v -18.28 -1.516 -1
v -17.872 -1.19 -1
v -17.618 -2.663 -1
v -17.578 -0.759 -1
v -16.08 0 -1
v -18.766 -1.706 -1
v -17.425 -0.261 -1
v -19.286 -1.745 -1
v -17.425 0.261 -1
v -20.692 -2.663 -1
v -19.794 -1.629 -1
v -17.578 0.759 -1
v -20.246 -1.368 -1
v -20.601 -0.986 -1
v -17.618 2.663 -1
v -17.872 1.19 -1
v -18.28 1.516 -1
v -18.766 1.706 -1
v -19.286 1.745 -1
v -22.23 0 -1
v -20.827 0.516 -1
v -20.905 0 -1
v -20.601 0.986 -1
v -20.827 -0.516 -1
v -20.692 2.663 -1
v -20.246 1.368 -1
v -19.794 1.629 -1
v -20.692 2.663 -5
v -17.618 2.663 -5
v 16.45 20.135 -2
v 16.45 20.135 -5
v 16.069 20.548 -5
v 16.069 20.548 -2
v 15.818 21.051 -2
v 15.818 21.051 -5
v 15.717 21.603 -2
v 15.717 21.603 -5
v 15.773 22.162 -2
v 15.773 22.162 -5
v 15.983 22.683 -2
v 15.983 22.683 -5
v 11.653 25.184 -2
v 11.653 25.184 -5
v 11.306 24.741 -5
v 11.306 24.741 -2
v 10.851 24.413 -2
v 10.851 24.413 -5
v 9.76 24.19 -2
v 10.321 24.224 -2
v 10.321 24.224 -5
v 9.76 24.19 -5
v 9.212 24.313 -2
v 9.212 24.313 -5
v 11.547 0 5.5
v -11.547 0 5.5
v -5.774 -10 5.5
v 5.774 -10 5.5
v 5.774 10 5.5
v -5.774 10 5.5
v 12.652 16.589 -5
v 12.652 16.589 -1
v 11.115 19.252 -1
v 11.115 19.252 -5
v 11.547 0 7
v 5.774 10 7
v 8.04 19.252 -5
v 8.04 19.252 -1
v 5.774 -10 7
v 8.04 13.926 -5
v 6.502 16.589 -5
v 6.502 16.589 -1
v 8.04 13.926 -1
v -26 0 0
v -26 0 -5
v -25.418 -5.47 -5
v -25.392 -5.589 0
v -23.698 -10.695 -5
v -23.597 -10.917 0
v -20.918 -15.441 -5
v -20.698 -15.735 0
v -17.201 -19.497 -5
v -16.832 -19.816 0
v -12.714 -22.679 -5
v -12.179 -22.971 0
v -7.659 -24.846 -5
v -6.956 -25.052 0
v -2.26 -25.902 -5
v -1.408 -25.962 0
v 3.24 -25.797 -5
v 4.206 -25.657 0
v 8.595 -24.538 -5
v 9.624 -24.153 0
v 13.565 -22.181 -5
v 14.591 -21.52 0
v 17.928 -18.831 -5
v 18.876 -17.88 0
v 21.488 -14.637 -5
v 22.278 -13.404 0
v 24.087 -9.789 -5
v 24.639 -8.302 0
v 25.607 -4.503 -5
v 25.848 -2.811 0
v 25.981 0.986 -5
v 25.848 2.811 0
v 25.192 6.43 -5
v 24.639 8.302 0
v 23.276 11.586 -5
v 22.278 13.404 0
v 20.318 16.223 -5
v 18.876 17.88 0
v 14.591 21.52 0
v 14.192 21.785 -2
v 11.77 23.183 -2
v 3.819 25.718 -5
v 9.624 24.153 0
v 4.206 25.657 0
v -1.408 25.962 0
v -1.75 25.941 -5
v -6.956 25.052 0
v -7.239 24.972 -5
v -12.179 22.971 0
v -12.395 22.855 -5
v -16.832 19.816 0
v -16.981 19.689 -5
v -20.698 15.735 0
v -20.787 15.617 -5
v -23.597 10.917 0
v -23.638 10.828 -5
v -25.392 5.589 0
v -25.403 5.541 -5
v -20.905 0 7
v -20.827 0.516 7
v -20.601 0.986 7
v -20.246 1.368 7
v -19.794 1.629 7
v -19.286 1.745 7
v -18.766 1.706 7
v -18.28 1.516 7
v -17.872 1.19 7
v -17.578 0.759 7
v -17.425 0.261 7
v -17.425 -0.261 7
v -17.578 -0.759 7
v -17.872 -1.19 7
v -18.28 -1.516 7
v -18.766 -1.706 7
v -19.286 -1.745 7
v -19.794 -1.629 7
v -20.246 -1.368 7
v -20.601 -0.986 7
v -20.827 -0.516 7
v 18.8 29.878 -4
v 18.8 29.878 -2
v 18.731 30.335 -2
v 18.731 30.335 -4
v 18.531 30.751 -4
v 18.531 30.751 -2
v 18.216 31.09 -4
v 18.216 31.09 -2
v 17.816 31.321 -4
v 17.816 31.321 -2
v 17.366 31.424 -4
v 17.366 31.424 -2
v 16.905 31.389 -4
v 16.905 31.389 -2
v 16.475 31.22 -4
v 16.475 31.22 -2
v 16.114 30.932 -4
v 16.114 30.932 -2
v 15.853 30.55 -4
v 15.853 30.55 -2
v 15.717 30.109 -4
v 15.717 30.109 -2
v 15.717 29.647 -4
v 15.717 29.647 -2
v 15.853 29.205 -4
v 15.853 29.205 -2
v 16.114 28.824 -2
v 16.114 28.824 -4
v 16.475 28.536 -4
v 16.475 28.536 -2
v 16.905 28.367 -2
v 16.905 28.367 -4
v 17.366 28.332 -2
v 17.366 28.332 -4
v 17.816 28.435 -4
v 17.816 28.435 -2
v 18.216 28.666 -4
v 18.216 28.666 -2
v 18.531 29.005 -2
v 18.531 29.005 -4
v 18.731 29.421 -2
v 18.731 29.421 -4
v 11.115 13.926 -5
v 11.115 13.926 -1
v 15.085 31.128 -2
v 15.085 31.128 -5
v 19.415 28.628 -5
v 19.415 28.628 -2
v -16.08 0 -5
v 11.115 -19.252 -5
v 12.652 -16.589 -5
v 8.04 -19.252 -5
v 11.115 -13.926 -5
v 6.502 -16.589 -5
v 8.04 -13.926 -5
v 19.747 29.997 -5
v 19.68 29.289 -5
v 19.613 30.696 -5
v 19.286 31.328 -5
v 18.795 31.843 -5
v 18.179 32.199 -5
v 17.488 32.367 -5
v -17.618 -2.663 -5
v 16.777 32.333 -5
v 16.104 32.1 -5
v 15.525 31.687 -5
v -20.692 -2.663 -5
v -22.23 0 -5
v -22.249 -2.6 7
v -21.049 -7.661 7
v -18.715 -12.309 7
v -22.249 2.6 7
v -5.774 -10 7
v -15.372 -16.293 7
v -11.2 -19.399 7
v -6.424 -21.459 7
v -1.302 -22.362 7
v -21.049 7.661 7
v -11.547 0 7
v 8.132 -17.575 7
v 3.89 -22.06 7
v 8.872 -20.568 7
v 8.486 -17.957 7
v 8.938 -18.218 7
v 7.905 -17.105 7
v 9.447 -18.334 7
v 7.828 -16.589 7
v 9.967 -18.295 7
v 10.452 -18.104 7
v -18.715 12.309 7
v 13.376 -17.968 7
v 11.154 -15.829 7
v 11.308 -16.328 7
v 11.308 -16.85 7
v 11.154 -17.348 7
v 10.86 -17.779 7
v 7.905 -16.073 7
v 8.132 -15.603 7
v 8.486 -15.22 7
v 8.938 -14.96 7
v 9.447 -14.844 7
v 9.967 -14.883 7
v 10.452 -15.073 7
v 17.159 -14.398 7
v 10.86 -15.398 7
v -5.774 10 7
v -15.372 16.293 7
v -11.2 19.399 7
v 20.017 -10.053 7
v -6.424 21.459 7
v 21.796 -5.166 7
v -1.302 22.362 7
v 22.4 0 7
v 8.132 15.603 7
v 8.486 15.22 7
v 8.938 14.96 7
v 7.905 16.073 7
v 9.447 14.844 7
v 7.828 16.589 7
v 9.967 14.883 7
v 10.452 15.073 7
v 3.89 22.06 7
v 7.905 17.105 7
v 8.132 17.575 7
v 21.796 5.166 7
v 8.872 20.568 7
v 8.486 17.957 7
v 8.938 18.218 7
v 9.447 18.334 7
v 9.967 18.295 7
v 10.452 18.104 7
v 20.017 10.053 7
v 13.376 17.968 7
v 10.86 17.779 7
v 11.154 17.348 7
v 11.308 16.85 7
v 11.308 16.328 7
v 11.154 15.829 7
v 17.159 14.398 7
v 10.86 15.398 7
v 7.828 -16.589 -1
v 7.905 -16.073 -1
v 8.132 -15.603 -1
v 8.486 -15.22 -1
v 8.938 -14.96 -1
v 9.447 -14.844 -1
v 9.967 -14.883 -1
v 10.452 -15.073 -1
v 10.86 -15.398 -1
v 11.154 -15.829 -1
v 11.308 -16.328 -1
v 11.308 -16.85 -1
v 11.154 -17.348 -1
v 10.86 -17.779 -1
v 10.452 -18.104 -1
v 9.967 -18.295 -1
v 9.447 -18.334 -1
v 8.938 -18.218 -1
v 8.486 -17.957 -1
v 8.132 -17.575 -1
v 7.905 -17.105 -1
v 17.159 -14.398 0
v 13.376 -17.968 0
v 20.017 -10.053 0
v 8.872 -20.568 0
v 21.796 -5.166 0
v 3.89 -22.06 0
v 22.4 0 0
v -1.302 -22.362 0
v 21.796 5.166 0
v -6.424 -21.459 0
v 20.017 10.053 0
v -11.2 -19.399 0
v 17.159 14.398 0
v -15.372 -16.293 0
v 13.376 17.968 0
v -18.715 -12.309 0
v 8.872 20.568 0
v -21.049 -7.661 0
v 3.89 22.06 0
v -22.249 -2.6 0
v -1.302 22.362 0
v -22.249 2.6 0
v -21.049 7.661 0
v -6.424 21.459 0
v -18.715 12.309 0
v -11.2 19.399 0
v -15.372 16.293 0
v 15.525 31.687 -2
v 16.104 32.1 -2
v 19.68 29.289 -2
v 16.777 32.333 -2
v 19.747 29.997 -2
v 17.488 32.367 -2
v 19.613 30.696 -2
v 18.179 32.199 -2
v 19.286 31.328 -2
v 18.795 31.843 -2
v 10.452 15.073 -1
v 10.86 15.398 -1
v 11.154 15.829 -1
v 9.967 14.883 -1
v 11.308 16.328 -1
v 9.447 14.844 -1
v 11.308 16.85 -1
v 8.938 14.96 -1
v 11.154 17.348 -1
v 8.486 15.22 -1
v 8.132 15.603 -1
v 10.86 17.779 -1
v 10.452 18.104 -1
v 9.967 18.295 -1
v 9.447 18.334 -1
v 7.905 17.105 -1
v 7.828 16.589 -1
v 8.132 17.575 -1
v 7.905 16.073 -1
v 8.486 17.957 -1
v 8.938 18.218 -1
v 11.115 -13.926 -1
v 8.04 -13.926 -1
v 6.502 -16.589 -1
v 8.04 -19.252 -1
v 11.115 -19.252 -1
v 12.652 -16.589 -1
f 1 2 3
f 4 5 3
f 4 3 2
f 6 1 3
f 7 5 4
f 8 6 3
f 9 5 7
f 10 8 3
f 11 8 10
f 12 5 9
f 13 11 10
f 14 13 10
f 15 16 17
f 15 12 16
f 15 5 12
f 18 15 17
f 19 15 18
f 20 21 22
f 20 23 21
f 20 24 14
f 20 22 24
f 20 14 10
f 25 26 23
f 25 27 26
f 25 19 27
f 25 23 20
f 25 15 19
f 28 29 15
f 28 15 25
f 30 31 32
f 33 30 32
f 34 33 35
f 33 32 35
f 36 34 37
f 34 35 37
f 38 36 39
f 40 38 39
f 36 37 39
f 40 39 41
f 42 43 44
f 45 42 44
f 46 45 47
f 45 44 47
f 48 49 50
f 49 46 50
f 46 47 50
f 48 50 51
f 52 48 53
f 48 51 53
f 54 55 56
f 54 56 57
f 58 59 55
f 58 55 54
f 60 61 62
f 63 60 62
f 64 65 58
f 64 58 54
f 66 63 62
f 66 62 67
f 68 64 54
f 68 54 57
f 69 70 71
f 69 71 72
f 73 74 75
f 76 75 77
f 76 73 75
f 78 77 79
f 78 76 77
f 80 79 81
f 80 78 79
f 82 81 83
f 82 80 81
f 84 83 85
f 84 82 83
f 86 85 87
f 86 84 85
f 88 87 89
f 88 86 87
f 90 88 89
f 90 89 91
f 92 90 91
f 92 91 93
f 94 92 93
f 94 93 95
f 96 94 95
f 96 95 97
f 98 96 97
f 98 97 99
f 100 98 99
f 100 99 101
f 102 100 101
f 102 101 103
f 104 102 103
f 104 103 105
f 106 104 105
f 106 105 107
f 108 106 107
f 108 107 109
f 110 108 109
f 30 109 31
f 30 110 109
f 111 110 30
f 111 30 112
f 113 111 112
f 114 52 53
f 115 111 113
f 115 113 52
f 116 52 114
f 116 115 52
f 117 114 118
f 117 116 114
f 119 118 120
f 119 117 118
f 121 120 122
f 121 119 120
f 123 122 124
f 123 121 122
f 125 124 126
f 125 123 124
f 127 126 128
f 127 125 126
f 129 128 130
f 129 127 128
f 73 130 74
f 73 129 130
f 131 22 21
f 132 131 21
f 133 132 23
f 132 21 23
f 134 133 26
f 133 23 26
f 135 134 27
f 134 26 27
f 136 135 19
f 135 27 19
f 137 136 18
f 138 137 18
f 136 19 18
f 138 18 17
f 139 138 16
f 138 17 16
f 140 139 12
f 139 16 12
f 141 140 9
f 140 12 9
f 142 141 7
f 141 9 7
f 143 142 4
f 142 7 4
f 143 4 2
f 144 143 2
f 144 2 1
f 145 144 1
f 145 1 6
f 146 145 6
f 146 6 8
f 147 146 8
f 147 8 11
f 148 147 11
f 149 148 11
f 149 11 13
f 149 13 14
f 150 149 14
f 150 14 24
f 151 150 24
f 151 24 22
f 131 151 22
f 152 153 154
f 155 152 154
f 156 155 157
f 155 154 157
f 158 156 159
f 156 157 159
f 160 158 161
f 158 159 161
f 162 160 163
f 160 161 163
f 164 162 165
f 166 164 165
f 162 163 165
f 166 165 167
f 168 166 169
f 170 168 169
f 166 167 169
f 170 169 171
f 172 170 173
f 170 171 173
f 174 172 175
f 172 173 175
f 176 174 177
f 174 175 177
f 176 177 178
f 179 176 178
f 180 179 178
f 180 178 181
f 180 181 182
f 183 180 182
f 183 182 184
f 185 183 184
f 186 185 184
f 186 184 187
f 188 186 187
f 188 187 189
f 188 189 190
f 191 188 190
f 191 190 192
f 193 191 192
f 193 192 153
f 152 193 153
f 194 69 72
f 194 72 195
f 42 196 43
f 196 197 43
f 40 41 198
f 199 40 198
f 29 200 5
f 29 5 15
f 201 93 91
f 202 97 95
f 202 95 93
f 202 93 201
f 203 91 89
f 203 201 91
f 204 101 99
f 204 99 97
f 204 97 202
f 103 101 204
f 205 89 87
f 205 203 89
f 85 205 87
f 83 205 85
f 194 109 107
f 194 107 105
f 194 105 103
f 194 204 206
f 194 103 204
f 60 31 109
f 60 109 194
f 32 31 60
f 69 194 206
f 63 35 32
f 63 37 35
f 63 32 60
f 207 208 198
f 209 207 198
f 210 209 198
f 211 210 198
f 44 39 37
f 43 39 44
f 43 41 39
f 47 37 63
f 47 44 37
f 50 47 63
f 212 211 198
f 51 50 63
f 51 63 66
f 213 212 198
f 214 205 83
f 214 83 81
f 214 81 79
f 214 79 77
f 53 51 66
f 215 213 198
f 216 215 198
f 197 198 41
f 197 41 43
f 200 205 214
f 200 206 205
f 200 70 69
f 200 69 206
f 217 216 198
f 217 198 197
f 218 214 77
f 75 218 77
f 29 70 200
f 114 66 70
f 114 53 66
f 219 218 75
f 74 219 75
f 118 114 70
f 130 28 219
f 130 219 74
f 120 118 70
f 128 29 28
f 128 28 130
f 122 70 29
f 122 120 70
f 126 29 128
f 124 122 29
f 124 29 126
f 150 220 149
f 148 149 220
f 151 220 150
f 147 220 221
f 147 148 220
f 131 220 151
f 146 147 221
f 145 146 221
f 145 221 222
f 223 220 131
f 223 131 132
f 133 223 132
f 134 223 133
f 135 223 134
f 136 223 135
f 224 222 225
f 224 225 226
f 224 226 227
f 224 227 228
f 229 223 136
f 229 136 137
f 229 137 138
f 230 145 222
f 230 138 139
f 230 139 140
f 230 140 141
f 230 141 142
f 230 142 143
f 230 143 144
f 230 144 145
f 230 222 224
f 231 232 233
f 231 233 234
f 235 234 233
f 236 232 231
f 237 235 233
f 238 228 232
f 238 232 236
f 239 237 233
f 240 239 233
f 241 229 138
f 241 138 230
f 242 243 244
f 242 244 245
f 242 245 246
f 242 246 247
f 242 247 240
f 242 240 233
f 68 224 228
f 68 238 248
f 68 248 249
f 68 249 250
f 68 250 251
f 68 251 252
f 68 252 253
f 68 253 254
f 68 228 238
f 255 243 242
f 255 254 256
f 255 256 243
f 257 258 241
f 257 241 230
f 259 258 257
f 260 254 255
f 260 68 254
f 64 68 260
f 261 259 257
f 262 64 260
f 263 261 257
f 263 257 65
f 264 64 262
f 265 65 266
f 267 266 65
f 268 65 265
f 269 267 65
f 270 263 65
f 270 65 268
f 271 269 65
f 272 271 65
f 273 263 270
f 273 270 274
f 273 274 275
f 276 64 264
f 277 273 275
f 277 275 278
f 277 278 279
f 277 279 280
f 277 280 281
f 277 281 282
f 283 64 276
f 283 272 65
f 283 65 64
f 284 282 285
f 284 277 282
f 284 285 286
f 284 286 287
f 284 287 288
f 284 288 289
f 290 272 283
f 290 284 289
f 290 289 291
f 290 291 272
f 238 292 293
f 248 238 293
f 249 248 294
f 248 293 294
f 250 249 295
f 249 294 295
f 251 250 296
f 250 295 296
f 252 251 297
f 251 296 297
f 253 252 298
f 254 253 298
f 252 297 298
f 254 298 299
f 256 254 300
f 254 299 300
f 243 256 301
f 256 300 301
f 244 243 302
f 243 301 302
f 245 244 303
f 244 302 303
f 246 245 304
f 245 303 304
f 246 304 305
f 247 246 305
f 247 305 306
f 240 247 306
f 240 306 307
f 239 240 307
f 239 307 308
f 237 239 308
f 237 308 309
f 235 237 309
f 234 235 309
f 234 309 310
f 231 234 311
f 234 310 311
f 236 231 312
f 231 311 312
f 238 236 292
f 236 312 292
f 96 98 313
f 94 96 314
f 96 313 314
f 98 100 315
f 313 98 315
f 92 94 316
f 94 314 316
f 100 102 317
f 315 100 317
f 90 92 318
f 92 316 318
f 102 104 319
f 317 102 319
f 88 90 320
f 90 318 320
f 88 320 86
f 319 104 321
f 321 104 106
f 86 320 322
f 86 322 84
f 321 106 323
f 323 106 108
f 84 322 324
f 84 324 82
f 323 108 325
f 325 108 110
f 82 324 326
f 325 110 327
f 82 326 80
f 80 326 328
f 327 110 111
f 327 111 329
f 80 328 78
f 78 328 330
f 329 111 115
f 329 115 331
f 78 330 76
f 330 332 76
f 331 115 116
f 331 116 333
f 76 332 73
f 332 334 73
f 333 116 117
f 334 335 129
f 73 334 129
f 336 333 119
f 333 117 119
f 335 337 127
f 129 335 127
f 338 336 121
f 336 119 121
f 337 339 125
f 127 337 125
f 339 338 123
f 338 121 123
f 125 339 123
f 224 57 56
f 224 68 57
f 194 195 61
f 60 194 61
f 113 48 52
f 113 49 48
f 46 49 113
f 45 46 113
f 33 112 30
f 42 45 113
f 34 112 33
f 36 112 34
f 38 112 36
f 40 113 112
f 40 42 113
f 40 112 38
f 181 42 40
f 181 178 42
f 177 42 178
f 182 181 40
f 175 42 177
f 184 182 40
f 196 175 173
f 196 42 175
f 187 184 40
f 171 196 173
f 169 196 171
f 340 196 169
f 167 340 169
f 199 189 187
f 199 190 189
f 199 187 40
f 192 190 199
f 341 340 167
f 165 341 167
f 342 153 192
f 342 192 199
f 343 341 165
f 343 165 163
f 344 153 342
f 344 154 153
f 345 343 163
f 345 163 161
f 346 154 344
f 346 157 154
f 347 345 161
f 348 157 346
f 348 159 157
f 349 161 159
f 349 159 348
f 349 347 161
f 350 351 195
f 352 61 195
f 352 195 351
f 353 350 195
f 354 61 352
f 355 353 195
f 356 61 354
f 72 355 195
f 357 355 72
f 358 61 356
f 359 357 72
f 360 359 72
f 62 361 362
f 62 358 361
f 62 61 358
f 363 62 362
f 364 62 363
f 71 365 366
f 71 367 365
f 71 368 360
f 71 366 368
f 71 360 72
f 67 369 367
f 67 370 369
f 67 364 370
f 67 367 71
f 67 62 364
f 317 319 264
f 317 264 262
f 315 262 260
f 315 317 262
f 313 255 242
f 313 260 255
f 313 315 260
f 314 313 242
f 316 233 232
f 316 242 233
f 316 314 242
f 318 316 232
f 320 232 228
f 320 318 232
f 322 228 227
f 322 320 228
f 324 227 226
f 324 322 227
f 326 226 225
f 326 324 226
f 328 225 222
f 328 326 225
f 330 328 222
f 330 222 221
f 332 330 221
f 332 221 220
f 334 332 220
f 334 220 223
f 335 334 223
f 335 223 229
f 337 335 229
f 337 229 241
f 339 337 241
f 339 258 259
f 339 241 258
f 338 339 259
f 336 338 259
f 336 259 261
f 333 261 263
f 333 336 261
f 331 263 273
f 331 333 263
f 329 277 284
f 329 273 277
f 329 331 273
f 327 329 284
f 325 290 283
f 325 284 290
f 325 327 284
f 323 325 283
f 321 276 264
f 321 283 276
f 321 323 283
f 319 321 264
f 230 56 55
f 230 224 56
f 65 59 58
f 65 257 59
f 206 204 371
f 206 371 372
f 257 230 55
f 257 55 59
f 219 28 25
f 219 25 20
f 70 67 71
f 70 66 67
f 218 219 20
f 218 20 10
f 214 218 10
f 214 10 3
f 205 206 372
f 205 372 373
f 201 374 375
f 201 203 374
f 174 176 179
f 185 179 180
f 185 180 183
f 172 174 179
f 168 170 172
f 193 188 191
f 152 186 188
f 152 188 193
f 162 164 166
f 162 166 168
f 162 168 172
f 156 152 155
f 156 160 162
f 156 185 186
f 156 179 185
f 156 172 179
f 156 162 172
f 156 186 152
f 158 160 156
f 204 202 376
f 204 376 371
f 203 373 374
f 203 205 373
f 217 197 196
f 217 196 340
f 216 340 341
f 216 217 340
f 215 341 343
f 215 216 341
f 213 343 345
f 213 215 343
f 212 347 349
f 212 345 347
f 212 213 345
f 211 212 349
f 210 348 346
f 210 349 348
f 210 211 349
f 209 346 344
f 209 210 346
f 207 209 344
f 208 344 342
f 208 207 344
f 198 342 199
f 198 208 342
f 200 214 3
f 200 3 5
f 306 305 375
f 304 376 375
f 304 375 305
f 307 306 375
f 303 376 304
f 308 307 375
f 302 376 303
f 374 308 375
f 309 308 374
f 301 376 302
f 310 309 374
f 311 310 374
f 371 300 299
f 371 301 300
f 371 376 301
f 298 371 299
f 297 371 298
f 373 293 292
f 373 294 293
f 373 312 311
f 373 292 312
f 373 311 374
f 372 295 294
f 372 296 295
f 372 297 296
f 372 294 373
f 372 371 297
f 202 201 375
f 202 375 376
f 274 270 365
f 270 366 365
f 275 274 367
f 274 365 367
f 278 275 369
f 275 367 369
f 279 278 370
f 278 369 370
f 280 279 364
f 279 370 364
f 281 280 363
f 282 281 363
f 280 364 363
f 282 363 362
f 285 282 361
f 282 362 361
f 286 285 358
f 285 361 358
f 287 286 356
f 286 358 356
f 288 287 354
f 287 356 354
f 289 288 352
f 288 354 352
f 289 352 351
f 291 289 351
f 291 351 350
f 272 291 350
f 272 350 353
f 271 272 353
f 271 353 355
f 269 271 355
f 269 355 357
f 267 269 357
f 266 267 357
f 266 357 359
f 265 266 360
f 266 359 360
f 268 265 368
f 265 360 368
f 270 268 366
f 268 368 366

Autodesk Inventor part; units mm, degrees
ref_plane "YZ Plane" through (0, 0, 0) normal (1, 0, 0) x (0, 1, 0)
ref_plane "XZ Plane" through (0, 0, 0) normal (0, 1, 0) x (-1, 0, 0)
sketch "Sketch1" plane through (0, 0, 0) normal (0, 0, 1) x (1, 0, 0)
  circle A0 centre (0, 0) radius 22.4
  dimension "d0" = 44.8
extrude "Extrusion1" add sketch "Sketch1" along normal blind 7
sketch "Sketch2" plane through (0, 0, 0) normal (0, 0, -1) x (-1, 0, 0)
  circle A0 centre (0, 0) radius 26
  dimension "d3" = 52
extrude "Extrusion2" add sketch "Sketch2" along normal blind 5
sketch "Sketch3" plane through (0, 0, -5) normal (0, 0, -1) x (-1, 0, 0)
  line L0 (22.23, 0) -> (20.6925, -2.663)
  line L1 (20.6925, -2.663) -> (17.6175, -2.663)
  line L2 (17.6175, -2.663) -> (16.08, 0)
  line L3 (16.08, 0) -> (17.6175, 2.663)
  line L4 (17.6175, 2.663) -> (20.6925, 2.663)
  line L5 (20.6925, 2.663) -> (22.23, 0)
  line L6 (-11.115, 19.2517) -> (-8.04, 19.2517)
  line L7 (-8.04, 19.2517) -> (-6.5025, 16.5887)
  line L8 (-6.5025, 16.5887) -> (-8.04, 13.9257)
  line L9 (-8.04, 13.9257) -> (-11.115, 13.9257)
  line L10 (-11.115, 13.9257) -> (-12.6525, 16.5887)
  line L11 (-12.6525, 16.5887) -> (-11.115, 19.2517)
  line L12 (-11.115, -19.2517) -> (-12.6525, -16.5887)
  line L13 (-12.6525, -16.5887) -> (-11.115, -13.9257)
  line L14 (-11.115, -13.9257) -> (-8.04, -13.9257)
  line L15 (-8.04, -13.9257) -> (-6.5025, -16.5887)
  line L16 (-6.5025, -16.5887) -> (-8.04, -19.2517)
  line L17 (-8.04, -19.2517) -> (-11.115, -19.2517)
  point P0 (0, 0)
  point P1 (19.155, 0)
  point P2 (-9.5775, 16.5887)
  point P3 (-9.5775, -16.5887)
  dimension "d6" = 3.075
  dimension "d7" = 19.155
  dimension "d10" = 360
extrude "Extrusion3" cut sketch "Sketch3" against normal blind 4
sketch "Sketch4" plane through (0, 0, -5) normal (0, 0, -1) x (-1, 0, 0)
  circle A0 centre (19.155, 0) radius 1.75
  circle A1 centre (-9.5775, 16.5887) radius 1.75
  circle A2 centre (-9.5775, -16.5887) radius 1.75
  point P0 (0, 0)
  dimension "d14" = 3.5
  dimension "d15" = 19.155
  dimension "d18" = 360
extrude "Extrusion4" cut sketch "Sketch4" against normal through all
sketch "Sketch5" plane through (0, 0, 7) normal (0, 0, 1) x (1, 0, 0)
  line L0 (-11.547, 0) -> (-5.7735, 10)
  line L1 (-5.7735, 10) -> (5.7735, 10)
  line L2 (5.7735, 10) -> (11.547, 0)
  line L3 (11.547, 0) -> (5.7735, -10)
  line L4 (5.7735, -10) -> (-5.7735, -10)
  line L5 (-5.7735, -10) -> (-11.547, 0)
  point P0 (0, 0)
  point P1 (0, 0)
  dimension "d22" = 10
extrude "Extrusion5" cut sketch "Sketch5" against normal blind 1.5
ref_plane "Work Plane1" through (0, 0, 6.5) normal (0, 0, 1) x (1, 0, 0)
sketch "Sketch6" plane through (0, 0, 6.5) normal (0, 0, 1) x (1, 0, 0)
  circle A0 centre (0, 0) radius 22.5
  circle A1 centre (0, 0) radius 22.4 projected
  circle A2 centre (0, 0) radius 21.1
  dimension "d26" = 45
  dimension "d27" = 42.2
extrude "Extrusion6" [suppressed]
sketch "Sketch7" plane through (0, 0, -5) normal (0, 0, -1) x (-1, 0, 0)
  point P0 (0, 0)
sketch "Sketch8" plane through (0, 0, -5) normal (0, 0, 1) x (1, 0, 0)
  line L0 (0, 0) -> (17.25, 29.8779)
  line L1 (0, 0) -> (34.5, 0) construction
  circle A0 centre (0, 0) radius 26 projected
  line L2 (13, 22.5167) -> (17.25, 29.8779) construction
  line L3 (15.1651, 21.2667) -> (19.4151, 28.6279)
  line L4 (15.0849, 31.1279) -> (10.8349, 23.7667)
  arc A1 (10.8349, 23.7667) -> (15.1651, 21.2667) centre (13, 22.5167) ccw
  arc A2 (19.4151, 28.6279) -> (15.0849, 31.1279) centre (17.25, 29.8779) ccw
  point P0 (15.125, 26.1973)
  point P1 (10.7773, 23.6611)
  point P2 (15.1025, 21.164)
  dimension "d30" = 34.5
  dimension "d31" = 60
  dimension "d32" = 5
extrude "Extrusion7" add sketch "Sketch8" along normal blind 3 contours A0 A1 L4 A2 L3
sketch "Sketch9" plane through (0, 0, -2) normal (0, 0, 1) x (1, 0, 0)
  arc A0 (19.4151, 28.6279) -> (15.0849, 31.1279) centre (17.25, 29.8779) ccw projected
  circle A1 centre (17.25, 29.8779) radius 1.55
  point P0 (0, 0)
  dimension "d35" = 3.1
extrude "Extrusion8" cut sketch "Sketch9" against normal blind 2
fillet "Fillet1" radius 2 2 edges at (15.1025, 21.164, -3.5) (10.7773, 23.6611, -3.5)
properties part number "Planet Carrier 3"
